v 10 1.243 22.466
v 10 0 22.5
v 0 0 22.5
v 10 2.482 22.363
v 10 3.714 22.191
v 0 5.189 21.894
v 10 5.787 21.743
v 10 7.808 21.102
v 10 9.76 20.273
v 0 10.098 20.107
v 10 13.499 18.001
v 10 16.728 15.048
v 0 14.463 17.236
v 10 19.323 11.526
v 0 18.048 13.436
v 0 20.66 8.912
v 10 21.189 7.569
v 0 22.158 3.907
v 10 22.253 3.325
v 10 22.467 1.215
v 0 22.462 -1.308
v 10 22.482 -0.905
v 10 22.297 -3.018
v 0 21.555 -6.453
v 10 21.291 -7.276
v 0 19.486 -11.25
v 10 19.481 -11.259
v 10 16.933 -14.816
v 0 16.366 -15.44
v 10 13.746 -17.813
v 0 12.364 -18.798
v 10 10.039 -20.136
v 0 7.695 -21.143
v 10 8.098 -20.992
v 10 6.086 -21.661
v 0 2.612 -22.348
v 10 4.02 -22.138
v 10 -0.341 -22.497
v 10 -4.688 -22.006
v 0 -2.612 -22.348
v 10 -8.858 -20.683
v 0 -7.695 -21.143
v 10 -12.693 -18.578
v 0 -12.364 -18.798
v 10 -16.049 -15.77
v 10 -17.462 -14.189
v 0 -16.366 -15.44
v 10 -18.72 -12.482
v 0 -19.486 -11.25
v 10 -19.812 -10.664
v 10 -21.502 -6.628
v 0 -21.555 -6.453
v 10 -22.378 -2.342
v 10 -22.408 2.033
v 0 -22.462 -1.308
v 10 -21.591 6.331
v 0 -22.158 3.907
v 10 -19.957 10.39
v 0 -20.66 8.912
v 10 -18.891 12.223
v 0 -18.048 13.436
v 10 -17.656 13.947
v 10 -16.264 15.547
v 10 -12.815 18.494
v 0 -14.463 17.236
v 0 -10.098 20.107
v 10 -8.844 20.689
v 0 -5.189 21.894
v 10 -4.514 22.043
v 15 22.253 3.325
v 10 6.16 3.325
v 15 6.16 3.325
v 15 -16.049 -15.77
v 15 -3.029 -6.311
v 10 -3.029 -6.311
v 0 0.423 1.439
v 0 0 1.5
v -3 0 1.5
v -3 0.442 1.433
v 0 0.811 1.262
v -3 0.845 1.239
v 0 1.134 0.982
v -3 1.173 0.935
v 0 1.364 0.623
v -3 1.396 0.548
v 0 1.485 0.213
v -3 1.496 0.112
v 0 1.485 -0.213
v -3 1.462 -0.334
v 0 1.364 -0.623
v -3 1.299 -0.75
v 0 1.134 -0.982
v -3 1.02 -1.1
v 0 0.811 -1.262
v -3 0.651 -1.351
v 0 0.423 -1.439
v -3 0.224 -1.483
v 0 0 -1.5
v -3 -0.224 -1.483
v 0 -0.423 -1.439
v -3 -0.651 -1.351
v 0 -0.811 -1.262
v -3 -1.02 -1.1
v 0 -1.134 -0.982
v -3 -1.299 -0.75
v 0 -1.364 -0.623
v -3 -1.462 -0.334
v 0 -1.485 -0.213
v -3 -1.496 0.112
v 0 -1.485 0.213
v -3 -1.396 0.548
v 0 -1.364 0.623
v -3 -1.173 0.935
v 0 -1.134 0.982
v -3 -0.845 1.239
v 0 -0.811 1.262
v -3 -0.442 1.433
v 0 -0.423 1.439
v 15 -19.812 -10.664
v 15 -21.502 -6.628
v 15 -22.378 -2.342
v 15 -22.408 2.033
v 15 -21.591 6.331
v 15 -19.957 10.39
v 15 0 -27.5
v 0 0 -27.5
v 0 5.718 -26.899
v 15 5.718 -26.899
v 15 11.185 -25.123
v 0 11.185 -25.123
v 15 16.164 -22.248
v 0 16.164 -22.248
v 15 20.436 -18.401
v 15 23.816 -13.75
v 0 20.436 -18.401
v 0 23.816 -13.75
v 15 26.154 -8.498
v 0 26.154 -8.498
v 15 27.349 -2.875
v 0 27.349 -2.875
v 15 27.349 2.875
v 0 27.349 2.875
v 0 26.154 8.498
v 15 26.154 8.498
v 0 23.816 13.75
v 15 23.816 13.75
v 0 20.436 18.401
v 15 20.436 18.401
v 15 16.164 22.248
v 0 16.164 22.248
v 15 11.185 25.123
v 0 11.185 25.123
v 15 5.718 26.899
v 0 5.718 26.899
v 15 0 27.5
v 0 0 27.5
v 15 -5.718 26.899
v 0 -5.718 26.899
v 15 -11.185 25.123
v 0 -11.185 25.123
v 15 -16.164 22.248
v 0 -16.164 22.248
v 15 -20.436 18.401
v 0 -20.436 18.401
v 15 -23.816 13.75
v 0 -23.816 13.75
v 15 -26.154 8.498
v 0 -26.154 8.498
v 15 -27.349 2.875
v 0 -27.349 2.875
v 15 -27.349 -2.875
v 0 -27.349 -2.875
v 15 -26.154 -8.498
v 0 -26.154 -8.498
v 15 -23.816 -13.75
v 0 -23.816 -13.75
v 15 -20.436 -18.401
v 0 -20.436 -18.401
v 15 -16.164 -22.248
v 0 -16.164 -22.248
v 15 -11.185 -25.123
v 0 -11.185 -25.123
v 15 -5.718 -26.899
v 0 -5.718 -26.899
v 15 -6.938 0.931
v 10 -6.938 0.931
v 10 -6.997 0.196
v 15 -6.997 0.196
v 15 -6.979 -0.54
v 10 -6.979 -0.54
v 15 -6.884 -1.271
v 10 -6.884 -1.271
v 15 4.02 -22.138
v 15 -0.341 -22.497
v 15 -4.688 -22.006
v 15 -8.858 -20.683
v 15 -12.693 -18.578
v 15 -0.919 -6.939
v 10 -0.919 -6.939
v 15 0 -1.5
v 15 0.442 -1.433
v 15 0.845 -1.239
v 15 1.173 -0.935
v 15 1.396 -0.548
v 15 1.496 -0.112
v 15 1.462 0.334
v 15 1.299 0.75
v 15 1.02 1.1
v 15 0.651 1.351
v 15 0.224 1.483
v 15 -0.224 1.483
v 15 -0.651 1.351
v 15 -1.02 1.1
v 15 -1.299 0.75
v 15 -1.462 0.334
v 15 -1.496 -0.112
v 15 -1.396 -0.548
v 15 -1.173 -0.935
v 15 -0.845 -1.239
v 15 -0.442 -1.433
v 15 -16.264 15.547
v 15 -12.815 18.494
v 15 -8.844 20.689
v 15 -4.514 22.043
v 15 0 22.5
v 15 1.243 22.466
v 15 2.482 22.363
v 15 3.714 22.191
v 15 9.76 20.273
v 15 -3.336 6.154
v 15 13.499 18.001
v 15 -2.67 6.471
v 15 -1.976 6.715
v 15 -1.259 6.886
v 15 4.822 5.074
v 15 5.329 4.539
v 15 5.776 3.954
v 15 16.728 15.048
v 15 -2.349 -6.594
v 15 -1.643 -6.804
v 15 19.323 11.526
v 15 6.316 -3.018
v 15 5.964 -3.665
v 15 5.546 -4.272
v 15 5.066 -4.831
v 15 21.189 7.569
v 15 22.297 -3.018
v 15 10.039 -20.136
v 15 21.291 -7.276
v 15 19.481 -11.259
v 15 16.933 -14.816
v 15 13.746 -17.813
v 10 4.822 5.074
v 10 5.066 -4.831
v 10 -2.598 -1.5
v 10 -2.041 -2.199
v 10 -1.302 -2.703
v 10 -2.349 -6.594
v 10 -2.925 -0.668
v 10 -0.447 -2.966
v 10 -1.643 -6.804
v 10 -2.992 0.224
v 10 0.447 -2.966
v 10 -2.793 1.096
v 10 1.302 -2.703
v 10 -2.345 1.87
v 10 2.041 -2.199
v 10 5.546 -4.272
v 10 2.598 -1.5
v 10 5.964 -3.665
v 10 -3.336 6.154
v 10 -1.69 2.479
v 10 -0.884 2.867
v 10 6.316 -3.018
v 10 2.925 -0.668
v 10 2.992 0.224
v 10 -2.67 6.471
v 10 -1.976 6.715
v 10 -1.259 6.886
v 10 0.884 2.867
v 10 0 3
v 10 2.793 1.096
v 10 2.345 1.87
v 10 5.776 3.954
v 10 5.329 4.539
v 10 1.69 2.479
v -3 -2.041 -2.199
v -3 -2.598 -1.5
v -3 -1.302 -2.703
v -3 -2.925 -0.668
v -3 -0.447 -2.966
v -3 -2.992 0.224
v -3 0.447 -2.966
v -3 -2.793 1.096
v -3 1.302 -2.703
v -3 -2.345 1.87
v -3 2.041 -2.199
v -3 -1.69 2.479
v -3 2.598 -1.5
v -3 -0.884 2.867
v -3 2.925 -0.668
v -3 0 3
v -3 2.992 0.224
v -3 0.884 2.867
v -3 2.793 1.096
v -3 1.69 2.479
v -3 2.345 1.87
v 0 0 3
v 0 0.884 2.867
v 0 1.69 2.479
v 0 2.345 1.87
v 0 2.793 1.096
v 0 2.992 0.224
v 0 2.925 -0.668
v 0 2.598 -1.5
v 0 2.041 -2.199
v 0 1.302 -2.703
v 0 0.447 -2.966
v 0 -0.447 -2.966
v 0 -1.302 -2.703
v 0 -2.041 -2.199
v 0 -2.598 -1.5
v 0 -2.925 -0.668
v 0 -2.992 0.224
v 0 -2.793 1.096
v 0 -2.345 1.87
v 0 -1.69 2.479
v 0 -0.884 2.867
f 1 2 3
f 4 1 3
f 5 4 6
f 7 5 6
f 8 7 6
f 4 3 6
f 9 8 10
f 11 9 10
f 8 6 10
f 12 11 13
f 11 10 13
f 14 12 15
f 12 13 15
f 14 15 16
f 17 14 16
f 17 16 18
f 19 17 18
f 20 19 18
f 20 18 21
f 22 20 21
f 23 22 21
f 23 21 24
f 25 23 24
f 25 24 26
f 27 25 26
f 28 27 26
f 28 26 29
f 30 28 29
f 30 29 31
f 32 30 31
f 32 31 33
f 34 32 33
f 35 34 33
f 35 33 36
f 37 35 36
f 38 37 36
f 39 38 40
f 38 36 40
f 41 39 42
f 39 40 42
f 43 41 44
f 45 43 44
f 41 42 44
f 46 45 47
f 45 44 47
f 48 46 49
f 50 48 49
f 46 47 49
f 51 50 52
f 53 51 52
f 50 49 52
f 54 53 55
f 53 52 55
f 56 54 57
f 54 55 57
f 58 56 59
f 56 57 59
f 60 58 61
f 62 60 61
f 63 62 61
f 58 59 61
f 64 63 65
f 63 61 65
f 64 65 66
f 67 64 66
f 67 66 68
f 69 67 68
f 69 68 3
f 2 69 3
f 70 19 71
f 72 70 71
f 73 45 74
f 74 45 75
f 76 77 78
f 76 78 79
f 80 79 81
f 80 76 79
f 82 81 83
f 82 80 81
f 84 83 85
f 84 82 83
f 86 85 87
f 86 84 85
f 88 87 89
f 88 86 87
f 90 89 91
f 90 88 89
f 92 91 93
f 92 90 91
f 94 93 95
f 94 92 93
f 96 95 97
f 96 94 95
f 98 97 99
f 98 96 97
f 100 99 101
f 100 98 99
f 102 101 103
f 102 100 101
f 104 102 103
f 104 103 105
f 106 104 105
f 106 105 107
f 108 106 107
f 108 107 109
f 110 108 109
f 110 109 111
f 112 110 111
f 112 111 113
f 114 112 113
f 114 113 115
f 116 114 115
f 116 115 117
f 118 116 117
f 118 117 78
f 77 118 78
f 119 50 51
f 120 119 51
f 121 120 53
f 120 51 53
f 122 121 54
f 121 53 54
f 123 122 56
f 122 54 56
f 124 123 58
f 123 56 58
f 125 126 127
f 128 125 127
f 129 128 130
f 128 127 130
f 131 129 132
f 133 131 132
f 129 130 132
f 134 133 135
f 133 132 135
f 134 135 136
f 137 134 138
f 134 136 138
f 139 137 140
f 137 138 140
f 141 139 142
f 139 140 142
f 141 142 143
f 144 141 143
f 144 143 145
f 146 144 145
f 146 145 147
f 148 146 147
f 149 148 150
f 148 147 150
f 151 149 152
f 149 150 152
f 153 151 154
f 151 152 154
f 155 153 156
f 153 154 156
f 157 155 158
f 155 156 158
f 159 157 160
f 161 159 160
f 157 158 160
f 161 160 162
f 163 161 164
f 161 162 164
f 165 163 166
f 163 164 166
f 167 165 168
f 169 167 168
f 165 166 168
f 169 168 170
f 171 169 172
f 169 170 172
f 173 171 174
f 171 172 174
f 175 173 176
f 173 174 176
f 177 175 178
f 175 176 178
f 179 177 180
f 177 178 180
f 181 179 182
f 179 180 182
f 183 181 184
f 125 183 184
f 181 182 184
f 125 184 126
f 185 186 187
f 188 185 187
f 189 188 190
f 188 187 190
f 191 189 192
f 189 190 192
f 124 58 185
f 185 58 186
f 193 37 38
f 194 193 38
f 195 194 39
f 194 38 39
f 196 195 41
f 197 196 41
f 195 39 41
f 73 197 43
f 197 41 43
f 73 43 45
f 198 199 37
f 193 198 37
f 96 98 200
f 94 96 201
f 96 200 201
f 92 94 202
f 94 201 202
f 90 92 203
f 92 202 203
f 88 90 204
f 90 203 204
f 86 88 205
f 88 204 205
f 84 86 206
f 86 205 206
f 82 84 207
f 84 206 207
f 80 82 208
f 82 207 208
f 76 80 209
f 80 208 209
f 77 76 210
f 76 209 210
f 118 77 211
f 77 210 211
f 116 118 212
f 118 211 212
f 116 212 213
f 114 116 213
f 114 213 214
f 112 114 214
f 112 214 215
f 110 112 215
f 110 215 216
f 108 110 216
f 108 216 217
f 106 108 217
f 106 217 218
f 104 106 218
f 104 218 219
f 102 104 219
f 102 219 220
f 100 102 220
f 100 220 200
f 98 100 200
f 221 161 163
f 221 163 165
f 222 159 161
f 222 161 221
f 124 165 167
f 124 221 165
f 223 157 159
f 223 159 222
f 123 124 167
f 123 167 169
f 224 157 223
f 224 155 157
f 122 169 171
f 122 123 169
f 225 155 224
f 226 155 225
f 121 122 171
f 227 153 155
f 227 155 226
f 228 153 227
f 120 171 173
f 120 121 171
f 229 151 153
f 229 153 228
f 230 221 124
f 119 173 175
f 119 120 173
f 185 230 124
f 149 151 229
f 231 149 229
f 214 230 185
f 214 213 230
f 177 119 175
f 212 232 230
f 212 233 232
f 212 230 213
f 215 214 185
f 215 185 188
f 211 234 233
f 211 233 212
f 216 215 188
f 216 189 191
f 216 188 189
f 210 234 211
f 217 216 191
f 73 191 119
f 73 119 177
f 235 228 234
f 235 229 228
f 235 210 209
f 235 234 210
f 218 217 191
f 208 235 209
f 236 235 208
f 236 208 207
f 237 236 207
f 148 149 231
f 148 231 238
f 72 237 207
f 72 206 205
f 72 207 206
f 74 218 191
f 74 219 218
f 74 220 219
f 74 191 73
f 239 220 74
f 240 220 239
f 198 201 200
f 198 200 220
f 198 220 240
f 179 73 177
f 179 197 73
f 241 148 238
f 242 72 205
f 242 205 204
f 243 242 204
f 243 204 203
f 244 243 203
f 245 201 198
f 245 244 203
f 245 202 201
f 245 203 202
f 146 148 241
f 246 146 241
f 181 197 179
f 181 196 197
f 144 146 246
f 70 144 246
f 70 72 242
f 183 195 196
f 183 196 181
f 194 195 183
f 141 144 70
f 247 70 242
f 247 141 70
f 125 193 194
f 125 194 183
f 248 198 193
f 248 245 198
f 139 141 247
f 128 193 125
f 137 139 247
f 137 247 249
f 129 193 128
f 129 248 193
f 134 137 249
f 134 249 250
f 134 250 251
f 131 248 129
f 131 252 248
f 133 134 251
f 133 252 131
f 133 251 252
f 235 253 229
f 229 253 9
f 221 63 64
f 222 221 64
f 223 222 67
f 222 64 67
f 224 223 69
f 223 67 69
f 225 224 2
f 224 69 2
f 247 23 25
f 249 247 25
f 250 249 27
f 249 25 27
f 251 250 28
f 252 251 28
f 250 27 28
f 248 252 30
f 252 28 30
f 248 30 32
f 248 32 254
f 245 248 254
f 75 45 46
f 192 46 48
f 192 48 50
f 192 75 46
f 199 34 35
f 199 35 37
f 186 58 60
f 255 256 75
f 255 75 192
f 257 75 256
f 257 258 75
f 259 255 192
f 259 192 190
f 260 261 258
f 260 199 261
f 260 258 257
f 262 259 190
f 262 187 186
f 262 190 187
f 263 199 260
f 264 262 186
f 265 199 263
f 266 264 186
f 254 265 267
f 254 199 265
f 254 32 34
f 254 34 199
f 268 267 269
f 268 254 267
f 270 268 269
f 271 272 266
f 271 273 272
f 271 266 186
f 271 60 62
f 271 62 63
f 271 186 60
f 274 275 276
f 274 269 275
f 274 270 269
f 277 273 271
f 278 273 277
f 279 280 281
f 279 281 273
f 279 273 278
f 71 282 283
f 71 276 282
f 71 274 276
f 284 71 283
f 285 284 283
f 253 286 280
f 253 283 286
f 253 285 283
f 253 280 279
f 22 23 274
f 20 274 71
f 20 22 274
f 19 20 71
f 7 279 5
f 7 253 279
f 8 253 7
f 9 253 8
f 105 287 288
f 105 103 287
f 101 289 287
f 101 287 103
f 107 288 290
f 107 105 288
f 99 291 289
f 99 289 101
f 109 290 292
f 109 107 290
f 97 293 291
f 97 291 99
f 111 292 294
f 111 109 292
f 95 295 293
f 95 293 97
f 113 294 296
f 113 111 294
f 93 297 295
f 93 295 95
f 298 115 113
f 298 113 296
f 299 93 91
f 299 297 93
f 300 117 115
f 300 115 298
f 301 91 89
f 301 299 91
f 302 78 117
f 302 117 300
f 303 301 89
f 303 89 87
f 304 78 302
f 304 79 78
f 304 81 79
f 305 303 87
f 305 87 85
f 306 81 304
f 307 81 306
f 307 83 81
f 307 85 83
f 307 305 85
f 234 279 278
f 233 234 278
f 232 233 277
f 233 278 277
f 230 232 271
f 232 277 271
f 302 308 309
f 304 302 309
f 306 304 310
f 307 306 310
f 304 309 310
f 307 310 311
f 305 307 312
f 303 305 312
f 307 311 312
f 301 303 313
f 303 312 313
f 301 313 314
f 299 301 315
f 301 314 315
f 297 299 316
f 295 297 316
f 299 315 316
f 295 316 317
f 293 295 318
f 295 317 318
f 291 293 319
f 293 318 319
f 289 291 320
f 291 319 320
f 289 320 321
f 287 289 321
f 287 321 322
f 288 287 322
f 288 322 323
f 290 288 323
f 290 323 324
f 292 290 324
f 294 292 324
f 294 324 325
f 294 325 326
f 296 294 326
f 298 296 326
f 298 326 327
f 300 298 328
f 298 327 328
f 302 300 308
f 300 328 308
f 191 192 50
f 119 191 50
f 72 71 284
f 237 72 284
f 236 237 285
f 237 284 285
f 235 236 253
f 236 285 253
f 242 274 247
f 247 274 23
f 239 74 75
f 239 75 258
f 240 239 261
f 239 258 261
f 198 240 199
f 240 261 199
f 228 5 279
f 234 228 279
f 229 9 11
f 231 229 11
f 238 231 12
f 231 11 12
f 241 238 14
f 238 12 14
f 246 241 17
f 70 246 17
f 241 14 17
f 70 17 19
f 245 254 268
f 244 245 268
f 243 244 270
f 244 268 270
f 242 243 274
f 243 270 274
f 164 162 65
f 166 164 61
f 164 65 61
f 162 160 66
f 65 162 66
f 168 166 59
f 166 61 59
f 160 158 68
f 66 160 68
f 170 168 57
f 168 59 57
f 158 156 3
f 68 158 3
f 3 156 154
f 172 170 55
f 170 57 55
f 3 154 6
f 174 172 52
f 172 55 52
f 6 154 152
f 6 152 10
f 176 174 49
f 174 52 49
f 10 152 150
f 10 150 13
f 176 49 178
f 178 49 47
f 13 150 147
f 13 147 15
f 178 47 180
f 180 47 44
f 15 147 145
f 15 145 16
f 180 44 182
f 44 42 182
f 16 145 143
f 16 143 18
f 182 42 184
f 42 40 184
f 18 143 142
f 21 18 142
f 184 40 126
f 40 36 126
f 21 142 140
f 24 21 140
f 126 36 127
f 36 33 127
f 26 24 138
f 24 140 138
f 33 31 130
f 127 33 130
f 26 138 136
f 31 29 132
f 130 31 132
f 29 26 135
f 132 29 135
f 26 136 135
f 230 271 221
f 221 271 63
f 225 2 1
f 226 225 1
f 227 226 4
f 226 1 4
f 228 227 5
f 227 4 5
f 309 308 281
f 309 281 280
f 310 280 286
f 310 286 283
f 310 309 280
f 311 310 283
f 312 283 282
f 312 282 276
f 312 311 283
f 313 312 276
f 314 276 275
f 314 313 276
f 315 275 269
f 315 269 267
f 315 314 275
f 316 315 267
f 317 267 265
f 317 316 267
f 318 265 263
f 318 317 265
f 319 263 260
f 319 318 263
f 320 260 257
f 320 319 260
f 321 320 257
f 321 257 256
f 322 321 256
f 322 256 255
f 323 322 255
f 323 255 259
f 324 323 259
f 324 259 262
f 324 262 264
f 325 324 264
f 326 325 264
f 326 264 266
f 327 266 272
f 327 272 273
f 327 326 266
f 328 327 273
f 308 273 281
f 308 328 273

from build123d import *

# Parameters (mm, degrees)
SKETCH1_R           = 27.5
BOSS_EXTRUDE1_DEPTH = 15
SKETCH2_R           = 1.5
CUT_EXTRUDE1_DEPTH  = 16
SKETCH3_R           = 22.5
SKETCH3_R_2         = 3
CUT_EXTRUDE2_DEPTH  = 10
SKETCH4_R           = 3
SKETCH4_R_2         = 1.5
BOSS_EXTRUDE2_DEPTH = 3
CUT_EXTRUDE3_DEPTH  = 6


with BuildPart() as part:
    # Sketch1 → Boss-Extrude1 (new body)
    with BuildSketch(Plane(origin=(0, 0, 0), x_dir=(0, 0, -1), z_dir=(1, 0, 0))):
        Circle(SKETCH1_R)
    extrude(amount=BOSS_EXTRUDE1_DEPTH)

    # Sketch2 → Cut-Extrude1 (cut, through all)
    with BuildSketch(Plane(origin=(15, 0, 0), x_dir=(0, 0, -1), z_dir=(1, 0, 0))):
        Circle(SKETCH2_R)
    extrude(amount=-CUT_EXTRUDE1_DEPTH, mode=Mode.SUBTRACT)

    # Sketch3 → Cut-Extrude2 (cut)
    with BuildSketch(Plane.ZY):
        Circle(SKETCH3_R)
        Circle(SKETCH3_R_2, mode=Mode.SUBTRACT)
    extrude(amount=-CUT_EXTRUDE2_DEPTH, mode=Mode.SUBTRACT)

    # Sketch4 → Boss-Extrude2 (add)
    with BuildSketch(Plane.ZY):
        Circle(SKETCH4_R)
        Circle(SKETCH4_R_2, mode=Mode.SUBTRACT)
    extrude(amount=BOSS_EXTRUDE2_DEPTH)

    # Sketch5 → Cut-Extrude3 (cut, through all)
    with BuildSketch(Plane.ZY.offset(-10)):
        with BuildLine():
            Line((5.074237821, 4.822044228), (20.272779151, 9.76034966))
            ThreePointArc((20.272779151, 9.76034966), (13.350301343, 18.111307353), (3.325036991, 22.252957759))
            Line((3.325036991, 22.252957759), (3.325036991, 6.1598806))
            ThreePointArc((3.325036991, 6.1598806), (4.252576382, 5.560179324), (5.074237821, 4.822044228))
        make_face()
        with BuildLine():
            Line((-3.018010865, 6.315980559), (-3.018010865, 22.296672631))
            ThreePointArc((-3.018010865, 22.296672631), (-13.099406882, 18.293592849), (-20.136327546, 10.03884022))
            Line((-20.136327546, 10.03884022), (-4.830901647, 5.065805886))
            ThreePointArc((-4.830901647, 5.065805886), (-3.973926406, 5.762630382), (-3.018010865, 6.315980559))
        make_face()
        with BuildLine():
            Line((-6.939471114, -0.91855357), (-22.138012444, 4.019751862))
            ThreePointArc((-22.138012444, 4.019751862), (-21.446180029, -6.805245196), (-15.769971823, -16.048613295))
            Line((-15.769971823, -16.048613295), (-6.310698406, -3.029040382))
            ThreePointArc((-6.310698406, -3.029040382), (-6.70859797, -1.998677884), (-6.939471114, -0.91855357))
        make_face()
        with BuildLine():
            Line((10.389948957, -19.957428709), (0.93067554, -6.937855796))
            ThreePointArc((0.93067554, -6.937855796), (-0.172215156, -6.997881246), (-1.270818148, -6.883677886))
            Line((-1.270818148, -6.883677886), (-10.664033269, -19.812329354))
            ThreePointArc((-10.664033269, -19.812329354), (-0.155061304, -22.499465682), (10.389948957, -19.957428709))
        make_face()
        with BuildLine():
            ThreePointArc((22.5, 0), (22.422695556, 1.863524623), (22.19131342, 3.714244025))
            Line((22.19131342, 3.714244025), (6.885887521, -1.258790309))
            ThreePointArc((6.885887521, -1.258790309), (6.60216315, -2.326250576), (6.154062305, -3.335793331))
            Line((6.154062305, -3.335793331), (15.547277427, -16.264444799))
            ThreePointArc((15.547277427, -16.264444799), (20.688931124, -8.844101365), (22.5, 0))
        make_face()
    extrude(amount=-CUT_EXTRUDE3_DEPTH, mode=Mode.SUBTRACT)


solid = part.part
